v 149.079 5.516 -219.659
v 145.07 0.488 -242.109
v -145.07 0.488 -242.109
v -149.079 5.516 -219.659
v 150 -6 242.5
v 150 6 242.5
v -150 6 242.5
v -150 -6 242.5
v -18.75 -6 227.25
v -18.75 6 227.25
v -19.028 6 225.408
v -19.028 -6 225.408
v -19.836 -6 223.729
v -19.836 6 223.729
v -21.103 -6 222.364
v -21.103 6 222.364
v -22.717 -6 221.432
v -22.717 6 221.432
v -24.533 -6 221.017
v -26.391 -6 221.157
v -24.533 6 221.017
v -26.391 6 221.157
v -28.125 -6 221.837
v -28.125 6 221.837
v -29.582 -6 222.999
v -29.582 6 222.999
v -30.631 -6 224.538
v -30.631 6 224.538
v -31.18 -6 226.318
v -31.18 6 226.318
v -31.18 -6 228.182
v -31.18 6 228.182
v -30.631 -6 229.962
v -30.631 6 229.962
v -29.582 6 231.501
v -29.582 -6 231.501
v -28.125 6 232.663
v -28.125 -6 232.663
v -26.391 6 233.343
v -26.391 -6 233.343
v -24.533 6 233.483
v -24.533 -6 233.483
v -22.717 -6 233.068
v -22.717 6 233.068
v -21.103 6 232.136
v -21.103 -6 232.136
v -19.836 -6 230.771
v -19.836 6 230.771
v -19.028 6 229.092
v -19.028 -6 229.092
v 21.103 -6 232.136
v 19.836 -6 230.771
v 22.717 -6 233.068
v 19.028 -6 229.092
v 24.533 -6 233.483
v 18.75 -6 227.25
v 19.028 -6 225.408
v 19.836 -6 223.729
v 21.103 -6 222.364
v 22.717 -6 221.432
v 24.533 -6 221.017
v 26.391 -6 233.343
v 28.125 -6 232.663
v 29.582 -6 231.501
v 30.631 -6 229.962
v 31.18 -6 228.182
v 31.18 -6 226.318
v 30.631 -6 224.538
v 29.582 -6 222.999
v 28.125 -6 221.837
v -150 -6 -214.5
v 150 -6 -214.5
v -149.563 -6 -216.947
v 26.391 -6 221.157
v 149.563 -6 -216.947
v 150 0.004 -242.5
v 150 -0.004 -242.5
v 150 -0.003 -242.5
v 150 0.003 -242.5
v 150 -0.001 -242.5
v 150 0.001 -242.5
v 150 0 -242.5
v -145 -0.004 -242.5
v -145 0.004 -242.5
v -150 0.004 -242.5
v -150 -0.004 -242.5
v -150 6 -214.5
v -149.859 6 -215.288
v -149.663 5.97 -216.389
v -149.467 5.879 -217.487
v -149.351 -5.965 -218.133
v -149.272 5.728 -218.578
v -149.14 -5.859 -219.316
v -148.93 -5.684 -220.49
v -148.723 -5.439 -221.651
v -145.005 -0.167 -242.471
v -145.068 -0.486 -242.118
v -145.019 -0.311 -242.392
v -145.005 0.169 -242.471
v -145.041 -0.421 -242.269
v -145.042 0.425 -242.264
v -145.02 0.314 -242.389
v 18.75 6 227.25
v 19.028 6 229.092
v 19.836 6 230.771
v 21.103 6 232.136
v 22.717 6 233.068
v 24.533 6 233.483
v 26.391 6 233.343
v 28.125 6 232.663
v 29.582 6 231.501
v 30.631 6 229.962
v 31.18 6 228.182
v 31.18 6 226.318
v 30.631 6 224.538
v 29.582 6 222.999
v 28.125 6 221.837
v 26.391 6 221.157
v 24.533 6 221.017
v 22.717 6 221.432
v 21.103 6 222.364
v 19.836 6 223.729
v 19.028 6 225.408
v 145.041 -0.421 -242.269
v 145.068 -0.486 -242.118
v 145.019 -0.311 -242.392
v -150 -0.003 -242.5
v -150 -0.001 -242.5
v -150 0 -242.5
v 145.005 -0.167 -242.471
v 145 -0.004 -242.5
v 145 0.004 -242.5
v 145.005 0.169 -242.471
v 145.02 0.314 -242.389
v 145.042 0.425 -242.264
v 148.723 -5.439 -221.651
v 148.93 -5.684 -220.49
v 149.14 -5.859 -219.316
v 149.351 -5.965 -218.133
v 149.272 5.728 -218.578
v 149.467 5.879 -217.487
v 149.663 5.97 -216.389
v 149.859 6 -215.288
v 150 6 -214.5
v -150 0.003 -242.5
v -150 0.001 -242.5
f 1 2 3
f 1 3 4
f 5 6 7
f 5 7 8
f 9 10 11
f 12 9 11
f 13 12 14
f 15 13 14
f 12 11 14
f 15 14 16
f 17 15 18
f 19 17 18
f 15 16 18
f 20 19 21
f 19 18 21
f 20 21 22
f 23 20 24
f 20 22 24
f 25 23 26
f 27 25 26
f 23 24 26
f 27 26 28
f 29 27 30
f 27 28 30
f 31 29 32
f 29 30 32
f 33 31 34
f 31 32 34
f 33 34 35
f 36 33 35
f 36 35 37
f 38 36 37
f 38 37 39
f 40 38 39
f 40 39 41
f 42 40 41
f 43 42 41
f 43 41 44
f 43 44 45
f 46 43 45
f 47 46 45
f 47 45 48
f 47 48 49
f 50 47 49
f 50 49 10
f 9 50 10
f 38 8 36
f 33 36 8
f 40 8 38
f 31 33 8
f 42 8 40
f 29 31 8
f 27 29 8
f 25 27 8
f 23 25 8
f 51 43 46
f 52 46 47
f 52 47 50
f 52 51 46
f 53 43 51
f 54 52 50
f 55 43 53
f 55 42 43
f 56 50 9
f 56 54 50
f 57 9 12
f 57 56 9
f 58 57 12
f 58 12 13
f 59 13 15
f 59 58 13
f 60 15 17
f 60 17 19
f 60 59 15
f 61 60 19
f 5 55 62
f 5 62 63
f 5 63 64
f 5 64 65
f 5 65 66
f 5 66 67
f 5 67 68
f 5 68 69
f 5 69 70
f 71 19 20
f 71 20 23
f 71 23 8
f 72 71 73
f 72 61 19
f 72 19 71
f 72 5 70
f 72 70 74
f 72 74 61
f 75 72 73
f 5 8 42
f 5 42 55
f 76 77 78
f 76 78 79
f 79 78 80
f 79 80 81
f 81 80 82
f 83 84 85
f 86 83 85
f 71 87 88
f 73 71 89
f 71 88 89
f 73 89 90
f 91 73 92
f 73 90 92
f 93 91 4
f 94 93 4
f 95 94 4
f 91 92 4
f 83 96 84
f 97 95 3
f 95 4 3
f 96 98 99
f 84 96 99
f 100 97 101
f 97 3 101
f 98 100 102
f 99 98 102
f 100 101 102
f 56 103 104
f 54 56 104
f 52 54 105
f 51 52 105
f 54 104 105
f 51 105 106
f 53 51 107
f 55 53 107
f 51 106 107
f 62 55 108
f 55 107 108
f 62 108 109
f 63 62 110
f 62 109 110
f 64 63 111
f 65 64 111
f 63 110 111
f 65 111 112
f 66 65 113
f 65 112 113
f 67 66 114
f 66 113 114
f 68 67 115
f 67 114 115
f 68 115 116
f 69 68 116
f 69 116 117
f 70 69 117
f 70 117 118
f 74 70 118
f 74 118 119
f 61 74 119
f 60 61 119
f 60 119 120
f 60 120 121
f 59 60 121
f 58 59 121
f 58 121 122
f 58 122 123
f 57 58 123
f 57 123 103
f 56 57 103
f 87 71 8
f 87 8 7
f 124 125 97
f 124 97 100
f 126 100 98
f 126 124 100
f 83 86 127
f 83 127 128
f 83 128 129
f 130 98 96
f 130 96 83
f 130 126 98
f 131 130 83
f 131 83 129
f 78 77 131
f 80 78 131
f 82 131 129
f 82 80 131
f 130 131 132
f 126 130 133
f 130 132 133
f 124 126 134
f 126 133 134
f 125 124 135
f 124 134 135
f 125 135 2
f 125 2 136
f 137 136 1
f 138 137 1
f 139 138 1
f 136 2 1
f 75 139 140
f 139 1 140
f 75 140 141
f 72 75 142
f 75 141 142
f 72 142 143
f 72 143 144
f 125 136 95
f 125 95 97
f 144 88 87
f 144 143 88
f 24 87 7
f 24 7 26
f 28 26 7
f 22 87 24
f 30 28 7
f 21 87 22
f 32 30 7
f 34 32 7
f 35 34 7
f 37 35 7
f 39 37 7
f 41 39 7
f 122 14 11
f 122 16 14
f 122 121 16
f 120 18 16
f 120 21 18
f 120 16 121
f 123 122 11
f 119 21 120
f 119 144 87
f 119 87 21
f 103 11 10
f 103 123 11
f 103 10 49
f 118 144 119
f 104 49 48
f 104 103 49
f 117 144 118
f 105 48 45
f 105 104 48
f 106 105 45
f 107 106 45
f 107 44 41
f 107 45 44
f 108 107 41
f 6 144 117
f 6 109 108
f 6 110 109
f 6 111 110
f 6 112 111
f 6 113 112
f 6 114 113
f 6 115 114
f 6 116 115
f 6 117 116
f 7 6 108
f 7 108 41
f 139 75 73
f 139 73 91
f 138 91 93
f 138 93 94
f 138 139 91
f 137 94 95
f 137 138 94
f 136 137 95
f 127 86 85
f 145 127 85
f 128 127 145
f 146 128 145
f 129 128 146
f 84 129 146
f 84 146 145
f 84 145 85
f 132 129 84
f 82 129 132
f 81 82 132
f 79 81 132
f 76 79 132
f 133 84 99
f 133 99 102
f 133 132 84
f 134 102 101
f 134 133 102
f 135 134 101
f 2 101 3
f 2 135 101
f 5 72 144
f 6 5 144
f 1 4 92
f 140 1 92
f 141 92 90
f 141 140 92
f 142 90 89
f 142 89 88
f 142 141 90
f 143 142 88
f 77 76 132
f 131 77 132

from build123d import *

# Parameters (mm, degrees)
F1_DEPTH = 150
F3_DEPTH = 25


with BuildPart() as f1:
    # F0 (on Right) → F1 (new body, symmetric)
    with BuildSketch(Plane.YZ):
        with BuildLine():
            Line((6, -215.287568), (6, 242.5))
            Line((6, 242.5), (-6, 242.5))
            Line((-6, 242.5), (-6, -216.946892))
            ThreePointArc((-6, -216.946892), (-5.859226, -219.315681), (-5.438884, -221.651124))
            Line((-5.438884, -221.651124), (-0.485972, -242.117606))
            ThreePointArc((-0.485972, -242.117606), (-0.05922, -241.503519), (0.5, -242))
            ThreePointArc((0.5, -242), (0.496969, -242.054975), (0.487911, -242.109284))
            Line((0.487911, -242.109284), (5.516432, -219.658939))
            ThreePointArc((5.516432, -219.658939), (5.87874, -217.486586), (6, -215.287568))
        make_face()
        with BuildLine():
            ThreePointArc((0, -242.5), (0.312536, -242.390283), (0.487911, -242.109284))
            ThreePointArc((0.487911, -242.109284), (0.496969, -242.054975), (0.5, -242))
            ThreePointArc((0.5, -242), (-0.05922, -241.503519), (-0.485972, -242.117606))
            ThreePointArc((-0.485972, -242.117606), (-0.30919, -242.392939), (0, -242.5))
        make_face()
    extrude(amount=F1_DEPTH, both=True)

    # F2 (on face) → F3 (cut)
    with BuildSketch(Plane(origin=(0, 6, 0), x_dir=(-1, 0, 0), z_dir=(0, 1, 0))):
        with BuildLine():
            Line((18.75, 227.25), (31.25, 227.25))
            ThreePointArc((31.25, 227.25), (25, 233.5), (18.75, 227.25))
        make_face()
        with BuildLine():
            ThreePointArc((-31.25, 227.25), (-25, 221), (-18.75, 227.25))
            Line((-18.75, 227.25), (-31.25, 227.25))
        make_face()
        with BuildLine():
            Line((-31.25, 227.25), (-18.75, 227.25))
            ThreePointArc((-18.75, 227.25), (-25, 233.5), (-31.25, 227.25))
        make_face()
        with BuildLine():
            ThreePointArc((18.75, 227.25), (25, 221), (31.25, 227.25))
            Line((31.25, 227.25), (18.75, 227.25))
        make_face()
        Polygon((-145, -242.499982), (-150, -214.500172), (-150.103354, -242.499982), align=None)
        Polygon((150.103354, -242.499982), (150, -214.500172), (145, -242.499982), align=None)
    extrude(amount=-F3_DEPTH, mode=Mode.SUBTRACT)


solid = f1.part
